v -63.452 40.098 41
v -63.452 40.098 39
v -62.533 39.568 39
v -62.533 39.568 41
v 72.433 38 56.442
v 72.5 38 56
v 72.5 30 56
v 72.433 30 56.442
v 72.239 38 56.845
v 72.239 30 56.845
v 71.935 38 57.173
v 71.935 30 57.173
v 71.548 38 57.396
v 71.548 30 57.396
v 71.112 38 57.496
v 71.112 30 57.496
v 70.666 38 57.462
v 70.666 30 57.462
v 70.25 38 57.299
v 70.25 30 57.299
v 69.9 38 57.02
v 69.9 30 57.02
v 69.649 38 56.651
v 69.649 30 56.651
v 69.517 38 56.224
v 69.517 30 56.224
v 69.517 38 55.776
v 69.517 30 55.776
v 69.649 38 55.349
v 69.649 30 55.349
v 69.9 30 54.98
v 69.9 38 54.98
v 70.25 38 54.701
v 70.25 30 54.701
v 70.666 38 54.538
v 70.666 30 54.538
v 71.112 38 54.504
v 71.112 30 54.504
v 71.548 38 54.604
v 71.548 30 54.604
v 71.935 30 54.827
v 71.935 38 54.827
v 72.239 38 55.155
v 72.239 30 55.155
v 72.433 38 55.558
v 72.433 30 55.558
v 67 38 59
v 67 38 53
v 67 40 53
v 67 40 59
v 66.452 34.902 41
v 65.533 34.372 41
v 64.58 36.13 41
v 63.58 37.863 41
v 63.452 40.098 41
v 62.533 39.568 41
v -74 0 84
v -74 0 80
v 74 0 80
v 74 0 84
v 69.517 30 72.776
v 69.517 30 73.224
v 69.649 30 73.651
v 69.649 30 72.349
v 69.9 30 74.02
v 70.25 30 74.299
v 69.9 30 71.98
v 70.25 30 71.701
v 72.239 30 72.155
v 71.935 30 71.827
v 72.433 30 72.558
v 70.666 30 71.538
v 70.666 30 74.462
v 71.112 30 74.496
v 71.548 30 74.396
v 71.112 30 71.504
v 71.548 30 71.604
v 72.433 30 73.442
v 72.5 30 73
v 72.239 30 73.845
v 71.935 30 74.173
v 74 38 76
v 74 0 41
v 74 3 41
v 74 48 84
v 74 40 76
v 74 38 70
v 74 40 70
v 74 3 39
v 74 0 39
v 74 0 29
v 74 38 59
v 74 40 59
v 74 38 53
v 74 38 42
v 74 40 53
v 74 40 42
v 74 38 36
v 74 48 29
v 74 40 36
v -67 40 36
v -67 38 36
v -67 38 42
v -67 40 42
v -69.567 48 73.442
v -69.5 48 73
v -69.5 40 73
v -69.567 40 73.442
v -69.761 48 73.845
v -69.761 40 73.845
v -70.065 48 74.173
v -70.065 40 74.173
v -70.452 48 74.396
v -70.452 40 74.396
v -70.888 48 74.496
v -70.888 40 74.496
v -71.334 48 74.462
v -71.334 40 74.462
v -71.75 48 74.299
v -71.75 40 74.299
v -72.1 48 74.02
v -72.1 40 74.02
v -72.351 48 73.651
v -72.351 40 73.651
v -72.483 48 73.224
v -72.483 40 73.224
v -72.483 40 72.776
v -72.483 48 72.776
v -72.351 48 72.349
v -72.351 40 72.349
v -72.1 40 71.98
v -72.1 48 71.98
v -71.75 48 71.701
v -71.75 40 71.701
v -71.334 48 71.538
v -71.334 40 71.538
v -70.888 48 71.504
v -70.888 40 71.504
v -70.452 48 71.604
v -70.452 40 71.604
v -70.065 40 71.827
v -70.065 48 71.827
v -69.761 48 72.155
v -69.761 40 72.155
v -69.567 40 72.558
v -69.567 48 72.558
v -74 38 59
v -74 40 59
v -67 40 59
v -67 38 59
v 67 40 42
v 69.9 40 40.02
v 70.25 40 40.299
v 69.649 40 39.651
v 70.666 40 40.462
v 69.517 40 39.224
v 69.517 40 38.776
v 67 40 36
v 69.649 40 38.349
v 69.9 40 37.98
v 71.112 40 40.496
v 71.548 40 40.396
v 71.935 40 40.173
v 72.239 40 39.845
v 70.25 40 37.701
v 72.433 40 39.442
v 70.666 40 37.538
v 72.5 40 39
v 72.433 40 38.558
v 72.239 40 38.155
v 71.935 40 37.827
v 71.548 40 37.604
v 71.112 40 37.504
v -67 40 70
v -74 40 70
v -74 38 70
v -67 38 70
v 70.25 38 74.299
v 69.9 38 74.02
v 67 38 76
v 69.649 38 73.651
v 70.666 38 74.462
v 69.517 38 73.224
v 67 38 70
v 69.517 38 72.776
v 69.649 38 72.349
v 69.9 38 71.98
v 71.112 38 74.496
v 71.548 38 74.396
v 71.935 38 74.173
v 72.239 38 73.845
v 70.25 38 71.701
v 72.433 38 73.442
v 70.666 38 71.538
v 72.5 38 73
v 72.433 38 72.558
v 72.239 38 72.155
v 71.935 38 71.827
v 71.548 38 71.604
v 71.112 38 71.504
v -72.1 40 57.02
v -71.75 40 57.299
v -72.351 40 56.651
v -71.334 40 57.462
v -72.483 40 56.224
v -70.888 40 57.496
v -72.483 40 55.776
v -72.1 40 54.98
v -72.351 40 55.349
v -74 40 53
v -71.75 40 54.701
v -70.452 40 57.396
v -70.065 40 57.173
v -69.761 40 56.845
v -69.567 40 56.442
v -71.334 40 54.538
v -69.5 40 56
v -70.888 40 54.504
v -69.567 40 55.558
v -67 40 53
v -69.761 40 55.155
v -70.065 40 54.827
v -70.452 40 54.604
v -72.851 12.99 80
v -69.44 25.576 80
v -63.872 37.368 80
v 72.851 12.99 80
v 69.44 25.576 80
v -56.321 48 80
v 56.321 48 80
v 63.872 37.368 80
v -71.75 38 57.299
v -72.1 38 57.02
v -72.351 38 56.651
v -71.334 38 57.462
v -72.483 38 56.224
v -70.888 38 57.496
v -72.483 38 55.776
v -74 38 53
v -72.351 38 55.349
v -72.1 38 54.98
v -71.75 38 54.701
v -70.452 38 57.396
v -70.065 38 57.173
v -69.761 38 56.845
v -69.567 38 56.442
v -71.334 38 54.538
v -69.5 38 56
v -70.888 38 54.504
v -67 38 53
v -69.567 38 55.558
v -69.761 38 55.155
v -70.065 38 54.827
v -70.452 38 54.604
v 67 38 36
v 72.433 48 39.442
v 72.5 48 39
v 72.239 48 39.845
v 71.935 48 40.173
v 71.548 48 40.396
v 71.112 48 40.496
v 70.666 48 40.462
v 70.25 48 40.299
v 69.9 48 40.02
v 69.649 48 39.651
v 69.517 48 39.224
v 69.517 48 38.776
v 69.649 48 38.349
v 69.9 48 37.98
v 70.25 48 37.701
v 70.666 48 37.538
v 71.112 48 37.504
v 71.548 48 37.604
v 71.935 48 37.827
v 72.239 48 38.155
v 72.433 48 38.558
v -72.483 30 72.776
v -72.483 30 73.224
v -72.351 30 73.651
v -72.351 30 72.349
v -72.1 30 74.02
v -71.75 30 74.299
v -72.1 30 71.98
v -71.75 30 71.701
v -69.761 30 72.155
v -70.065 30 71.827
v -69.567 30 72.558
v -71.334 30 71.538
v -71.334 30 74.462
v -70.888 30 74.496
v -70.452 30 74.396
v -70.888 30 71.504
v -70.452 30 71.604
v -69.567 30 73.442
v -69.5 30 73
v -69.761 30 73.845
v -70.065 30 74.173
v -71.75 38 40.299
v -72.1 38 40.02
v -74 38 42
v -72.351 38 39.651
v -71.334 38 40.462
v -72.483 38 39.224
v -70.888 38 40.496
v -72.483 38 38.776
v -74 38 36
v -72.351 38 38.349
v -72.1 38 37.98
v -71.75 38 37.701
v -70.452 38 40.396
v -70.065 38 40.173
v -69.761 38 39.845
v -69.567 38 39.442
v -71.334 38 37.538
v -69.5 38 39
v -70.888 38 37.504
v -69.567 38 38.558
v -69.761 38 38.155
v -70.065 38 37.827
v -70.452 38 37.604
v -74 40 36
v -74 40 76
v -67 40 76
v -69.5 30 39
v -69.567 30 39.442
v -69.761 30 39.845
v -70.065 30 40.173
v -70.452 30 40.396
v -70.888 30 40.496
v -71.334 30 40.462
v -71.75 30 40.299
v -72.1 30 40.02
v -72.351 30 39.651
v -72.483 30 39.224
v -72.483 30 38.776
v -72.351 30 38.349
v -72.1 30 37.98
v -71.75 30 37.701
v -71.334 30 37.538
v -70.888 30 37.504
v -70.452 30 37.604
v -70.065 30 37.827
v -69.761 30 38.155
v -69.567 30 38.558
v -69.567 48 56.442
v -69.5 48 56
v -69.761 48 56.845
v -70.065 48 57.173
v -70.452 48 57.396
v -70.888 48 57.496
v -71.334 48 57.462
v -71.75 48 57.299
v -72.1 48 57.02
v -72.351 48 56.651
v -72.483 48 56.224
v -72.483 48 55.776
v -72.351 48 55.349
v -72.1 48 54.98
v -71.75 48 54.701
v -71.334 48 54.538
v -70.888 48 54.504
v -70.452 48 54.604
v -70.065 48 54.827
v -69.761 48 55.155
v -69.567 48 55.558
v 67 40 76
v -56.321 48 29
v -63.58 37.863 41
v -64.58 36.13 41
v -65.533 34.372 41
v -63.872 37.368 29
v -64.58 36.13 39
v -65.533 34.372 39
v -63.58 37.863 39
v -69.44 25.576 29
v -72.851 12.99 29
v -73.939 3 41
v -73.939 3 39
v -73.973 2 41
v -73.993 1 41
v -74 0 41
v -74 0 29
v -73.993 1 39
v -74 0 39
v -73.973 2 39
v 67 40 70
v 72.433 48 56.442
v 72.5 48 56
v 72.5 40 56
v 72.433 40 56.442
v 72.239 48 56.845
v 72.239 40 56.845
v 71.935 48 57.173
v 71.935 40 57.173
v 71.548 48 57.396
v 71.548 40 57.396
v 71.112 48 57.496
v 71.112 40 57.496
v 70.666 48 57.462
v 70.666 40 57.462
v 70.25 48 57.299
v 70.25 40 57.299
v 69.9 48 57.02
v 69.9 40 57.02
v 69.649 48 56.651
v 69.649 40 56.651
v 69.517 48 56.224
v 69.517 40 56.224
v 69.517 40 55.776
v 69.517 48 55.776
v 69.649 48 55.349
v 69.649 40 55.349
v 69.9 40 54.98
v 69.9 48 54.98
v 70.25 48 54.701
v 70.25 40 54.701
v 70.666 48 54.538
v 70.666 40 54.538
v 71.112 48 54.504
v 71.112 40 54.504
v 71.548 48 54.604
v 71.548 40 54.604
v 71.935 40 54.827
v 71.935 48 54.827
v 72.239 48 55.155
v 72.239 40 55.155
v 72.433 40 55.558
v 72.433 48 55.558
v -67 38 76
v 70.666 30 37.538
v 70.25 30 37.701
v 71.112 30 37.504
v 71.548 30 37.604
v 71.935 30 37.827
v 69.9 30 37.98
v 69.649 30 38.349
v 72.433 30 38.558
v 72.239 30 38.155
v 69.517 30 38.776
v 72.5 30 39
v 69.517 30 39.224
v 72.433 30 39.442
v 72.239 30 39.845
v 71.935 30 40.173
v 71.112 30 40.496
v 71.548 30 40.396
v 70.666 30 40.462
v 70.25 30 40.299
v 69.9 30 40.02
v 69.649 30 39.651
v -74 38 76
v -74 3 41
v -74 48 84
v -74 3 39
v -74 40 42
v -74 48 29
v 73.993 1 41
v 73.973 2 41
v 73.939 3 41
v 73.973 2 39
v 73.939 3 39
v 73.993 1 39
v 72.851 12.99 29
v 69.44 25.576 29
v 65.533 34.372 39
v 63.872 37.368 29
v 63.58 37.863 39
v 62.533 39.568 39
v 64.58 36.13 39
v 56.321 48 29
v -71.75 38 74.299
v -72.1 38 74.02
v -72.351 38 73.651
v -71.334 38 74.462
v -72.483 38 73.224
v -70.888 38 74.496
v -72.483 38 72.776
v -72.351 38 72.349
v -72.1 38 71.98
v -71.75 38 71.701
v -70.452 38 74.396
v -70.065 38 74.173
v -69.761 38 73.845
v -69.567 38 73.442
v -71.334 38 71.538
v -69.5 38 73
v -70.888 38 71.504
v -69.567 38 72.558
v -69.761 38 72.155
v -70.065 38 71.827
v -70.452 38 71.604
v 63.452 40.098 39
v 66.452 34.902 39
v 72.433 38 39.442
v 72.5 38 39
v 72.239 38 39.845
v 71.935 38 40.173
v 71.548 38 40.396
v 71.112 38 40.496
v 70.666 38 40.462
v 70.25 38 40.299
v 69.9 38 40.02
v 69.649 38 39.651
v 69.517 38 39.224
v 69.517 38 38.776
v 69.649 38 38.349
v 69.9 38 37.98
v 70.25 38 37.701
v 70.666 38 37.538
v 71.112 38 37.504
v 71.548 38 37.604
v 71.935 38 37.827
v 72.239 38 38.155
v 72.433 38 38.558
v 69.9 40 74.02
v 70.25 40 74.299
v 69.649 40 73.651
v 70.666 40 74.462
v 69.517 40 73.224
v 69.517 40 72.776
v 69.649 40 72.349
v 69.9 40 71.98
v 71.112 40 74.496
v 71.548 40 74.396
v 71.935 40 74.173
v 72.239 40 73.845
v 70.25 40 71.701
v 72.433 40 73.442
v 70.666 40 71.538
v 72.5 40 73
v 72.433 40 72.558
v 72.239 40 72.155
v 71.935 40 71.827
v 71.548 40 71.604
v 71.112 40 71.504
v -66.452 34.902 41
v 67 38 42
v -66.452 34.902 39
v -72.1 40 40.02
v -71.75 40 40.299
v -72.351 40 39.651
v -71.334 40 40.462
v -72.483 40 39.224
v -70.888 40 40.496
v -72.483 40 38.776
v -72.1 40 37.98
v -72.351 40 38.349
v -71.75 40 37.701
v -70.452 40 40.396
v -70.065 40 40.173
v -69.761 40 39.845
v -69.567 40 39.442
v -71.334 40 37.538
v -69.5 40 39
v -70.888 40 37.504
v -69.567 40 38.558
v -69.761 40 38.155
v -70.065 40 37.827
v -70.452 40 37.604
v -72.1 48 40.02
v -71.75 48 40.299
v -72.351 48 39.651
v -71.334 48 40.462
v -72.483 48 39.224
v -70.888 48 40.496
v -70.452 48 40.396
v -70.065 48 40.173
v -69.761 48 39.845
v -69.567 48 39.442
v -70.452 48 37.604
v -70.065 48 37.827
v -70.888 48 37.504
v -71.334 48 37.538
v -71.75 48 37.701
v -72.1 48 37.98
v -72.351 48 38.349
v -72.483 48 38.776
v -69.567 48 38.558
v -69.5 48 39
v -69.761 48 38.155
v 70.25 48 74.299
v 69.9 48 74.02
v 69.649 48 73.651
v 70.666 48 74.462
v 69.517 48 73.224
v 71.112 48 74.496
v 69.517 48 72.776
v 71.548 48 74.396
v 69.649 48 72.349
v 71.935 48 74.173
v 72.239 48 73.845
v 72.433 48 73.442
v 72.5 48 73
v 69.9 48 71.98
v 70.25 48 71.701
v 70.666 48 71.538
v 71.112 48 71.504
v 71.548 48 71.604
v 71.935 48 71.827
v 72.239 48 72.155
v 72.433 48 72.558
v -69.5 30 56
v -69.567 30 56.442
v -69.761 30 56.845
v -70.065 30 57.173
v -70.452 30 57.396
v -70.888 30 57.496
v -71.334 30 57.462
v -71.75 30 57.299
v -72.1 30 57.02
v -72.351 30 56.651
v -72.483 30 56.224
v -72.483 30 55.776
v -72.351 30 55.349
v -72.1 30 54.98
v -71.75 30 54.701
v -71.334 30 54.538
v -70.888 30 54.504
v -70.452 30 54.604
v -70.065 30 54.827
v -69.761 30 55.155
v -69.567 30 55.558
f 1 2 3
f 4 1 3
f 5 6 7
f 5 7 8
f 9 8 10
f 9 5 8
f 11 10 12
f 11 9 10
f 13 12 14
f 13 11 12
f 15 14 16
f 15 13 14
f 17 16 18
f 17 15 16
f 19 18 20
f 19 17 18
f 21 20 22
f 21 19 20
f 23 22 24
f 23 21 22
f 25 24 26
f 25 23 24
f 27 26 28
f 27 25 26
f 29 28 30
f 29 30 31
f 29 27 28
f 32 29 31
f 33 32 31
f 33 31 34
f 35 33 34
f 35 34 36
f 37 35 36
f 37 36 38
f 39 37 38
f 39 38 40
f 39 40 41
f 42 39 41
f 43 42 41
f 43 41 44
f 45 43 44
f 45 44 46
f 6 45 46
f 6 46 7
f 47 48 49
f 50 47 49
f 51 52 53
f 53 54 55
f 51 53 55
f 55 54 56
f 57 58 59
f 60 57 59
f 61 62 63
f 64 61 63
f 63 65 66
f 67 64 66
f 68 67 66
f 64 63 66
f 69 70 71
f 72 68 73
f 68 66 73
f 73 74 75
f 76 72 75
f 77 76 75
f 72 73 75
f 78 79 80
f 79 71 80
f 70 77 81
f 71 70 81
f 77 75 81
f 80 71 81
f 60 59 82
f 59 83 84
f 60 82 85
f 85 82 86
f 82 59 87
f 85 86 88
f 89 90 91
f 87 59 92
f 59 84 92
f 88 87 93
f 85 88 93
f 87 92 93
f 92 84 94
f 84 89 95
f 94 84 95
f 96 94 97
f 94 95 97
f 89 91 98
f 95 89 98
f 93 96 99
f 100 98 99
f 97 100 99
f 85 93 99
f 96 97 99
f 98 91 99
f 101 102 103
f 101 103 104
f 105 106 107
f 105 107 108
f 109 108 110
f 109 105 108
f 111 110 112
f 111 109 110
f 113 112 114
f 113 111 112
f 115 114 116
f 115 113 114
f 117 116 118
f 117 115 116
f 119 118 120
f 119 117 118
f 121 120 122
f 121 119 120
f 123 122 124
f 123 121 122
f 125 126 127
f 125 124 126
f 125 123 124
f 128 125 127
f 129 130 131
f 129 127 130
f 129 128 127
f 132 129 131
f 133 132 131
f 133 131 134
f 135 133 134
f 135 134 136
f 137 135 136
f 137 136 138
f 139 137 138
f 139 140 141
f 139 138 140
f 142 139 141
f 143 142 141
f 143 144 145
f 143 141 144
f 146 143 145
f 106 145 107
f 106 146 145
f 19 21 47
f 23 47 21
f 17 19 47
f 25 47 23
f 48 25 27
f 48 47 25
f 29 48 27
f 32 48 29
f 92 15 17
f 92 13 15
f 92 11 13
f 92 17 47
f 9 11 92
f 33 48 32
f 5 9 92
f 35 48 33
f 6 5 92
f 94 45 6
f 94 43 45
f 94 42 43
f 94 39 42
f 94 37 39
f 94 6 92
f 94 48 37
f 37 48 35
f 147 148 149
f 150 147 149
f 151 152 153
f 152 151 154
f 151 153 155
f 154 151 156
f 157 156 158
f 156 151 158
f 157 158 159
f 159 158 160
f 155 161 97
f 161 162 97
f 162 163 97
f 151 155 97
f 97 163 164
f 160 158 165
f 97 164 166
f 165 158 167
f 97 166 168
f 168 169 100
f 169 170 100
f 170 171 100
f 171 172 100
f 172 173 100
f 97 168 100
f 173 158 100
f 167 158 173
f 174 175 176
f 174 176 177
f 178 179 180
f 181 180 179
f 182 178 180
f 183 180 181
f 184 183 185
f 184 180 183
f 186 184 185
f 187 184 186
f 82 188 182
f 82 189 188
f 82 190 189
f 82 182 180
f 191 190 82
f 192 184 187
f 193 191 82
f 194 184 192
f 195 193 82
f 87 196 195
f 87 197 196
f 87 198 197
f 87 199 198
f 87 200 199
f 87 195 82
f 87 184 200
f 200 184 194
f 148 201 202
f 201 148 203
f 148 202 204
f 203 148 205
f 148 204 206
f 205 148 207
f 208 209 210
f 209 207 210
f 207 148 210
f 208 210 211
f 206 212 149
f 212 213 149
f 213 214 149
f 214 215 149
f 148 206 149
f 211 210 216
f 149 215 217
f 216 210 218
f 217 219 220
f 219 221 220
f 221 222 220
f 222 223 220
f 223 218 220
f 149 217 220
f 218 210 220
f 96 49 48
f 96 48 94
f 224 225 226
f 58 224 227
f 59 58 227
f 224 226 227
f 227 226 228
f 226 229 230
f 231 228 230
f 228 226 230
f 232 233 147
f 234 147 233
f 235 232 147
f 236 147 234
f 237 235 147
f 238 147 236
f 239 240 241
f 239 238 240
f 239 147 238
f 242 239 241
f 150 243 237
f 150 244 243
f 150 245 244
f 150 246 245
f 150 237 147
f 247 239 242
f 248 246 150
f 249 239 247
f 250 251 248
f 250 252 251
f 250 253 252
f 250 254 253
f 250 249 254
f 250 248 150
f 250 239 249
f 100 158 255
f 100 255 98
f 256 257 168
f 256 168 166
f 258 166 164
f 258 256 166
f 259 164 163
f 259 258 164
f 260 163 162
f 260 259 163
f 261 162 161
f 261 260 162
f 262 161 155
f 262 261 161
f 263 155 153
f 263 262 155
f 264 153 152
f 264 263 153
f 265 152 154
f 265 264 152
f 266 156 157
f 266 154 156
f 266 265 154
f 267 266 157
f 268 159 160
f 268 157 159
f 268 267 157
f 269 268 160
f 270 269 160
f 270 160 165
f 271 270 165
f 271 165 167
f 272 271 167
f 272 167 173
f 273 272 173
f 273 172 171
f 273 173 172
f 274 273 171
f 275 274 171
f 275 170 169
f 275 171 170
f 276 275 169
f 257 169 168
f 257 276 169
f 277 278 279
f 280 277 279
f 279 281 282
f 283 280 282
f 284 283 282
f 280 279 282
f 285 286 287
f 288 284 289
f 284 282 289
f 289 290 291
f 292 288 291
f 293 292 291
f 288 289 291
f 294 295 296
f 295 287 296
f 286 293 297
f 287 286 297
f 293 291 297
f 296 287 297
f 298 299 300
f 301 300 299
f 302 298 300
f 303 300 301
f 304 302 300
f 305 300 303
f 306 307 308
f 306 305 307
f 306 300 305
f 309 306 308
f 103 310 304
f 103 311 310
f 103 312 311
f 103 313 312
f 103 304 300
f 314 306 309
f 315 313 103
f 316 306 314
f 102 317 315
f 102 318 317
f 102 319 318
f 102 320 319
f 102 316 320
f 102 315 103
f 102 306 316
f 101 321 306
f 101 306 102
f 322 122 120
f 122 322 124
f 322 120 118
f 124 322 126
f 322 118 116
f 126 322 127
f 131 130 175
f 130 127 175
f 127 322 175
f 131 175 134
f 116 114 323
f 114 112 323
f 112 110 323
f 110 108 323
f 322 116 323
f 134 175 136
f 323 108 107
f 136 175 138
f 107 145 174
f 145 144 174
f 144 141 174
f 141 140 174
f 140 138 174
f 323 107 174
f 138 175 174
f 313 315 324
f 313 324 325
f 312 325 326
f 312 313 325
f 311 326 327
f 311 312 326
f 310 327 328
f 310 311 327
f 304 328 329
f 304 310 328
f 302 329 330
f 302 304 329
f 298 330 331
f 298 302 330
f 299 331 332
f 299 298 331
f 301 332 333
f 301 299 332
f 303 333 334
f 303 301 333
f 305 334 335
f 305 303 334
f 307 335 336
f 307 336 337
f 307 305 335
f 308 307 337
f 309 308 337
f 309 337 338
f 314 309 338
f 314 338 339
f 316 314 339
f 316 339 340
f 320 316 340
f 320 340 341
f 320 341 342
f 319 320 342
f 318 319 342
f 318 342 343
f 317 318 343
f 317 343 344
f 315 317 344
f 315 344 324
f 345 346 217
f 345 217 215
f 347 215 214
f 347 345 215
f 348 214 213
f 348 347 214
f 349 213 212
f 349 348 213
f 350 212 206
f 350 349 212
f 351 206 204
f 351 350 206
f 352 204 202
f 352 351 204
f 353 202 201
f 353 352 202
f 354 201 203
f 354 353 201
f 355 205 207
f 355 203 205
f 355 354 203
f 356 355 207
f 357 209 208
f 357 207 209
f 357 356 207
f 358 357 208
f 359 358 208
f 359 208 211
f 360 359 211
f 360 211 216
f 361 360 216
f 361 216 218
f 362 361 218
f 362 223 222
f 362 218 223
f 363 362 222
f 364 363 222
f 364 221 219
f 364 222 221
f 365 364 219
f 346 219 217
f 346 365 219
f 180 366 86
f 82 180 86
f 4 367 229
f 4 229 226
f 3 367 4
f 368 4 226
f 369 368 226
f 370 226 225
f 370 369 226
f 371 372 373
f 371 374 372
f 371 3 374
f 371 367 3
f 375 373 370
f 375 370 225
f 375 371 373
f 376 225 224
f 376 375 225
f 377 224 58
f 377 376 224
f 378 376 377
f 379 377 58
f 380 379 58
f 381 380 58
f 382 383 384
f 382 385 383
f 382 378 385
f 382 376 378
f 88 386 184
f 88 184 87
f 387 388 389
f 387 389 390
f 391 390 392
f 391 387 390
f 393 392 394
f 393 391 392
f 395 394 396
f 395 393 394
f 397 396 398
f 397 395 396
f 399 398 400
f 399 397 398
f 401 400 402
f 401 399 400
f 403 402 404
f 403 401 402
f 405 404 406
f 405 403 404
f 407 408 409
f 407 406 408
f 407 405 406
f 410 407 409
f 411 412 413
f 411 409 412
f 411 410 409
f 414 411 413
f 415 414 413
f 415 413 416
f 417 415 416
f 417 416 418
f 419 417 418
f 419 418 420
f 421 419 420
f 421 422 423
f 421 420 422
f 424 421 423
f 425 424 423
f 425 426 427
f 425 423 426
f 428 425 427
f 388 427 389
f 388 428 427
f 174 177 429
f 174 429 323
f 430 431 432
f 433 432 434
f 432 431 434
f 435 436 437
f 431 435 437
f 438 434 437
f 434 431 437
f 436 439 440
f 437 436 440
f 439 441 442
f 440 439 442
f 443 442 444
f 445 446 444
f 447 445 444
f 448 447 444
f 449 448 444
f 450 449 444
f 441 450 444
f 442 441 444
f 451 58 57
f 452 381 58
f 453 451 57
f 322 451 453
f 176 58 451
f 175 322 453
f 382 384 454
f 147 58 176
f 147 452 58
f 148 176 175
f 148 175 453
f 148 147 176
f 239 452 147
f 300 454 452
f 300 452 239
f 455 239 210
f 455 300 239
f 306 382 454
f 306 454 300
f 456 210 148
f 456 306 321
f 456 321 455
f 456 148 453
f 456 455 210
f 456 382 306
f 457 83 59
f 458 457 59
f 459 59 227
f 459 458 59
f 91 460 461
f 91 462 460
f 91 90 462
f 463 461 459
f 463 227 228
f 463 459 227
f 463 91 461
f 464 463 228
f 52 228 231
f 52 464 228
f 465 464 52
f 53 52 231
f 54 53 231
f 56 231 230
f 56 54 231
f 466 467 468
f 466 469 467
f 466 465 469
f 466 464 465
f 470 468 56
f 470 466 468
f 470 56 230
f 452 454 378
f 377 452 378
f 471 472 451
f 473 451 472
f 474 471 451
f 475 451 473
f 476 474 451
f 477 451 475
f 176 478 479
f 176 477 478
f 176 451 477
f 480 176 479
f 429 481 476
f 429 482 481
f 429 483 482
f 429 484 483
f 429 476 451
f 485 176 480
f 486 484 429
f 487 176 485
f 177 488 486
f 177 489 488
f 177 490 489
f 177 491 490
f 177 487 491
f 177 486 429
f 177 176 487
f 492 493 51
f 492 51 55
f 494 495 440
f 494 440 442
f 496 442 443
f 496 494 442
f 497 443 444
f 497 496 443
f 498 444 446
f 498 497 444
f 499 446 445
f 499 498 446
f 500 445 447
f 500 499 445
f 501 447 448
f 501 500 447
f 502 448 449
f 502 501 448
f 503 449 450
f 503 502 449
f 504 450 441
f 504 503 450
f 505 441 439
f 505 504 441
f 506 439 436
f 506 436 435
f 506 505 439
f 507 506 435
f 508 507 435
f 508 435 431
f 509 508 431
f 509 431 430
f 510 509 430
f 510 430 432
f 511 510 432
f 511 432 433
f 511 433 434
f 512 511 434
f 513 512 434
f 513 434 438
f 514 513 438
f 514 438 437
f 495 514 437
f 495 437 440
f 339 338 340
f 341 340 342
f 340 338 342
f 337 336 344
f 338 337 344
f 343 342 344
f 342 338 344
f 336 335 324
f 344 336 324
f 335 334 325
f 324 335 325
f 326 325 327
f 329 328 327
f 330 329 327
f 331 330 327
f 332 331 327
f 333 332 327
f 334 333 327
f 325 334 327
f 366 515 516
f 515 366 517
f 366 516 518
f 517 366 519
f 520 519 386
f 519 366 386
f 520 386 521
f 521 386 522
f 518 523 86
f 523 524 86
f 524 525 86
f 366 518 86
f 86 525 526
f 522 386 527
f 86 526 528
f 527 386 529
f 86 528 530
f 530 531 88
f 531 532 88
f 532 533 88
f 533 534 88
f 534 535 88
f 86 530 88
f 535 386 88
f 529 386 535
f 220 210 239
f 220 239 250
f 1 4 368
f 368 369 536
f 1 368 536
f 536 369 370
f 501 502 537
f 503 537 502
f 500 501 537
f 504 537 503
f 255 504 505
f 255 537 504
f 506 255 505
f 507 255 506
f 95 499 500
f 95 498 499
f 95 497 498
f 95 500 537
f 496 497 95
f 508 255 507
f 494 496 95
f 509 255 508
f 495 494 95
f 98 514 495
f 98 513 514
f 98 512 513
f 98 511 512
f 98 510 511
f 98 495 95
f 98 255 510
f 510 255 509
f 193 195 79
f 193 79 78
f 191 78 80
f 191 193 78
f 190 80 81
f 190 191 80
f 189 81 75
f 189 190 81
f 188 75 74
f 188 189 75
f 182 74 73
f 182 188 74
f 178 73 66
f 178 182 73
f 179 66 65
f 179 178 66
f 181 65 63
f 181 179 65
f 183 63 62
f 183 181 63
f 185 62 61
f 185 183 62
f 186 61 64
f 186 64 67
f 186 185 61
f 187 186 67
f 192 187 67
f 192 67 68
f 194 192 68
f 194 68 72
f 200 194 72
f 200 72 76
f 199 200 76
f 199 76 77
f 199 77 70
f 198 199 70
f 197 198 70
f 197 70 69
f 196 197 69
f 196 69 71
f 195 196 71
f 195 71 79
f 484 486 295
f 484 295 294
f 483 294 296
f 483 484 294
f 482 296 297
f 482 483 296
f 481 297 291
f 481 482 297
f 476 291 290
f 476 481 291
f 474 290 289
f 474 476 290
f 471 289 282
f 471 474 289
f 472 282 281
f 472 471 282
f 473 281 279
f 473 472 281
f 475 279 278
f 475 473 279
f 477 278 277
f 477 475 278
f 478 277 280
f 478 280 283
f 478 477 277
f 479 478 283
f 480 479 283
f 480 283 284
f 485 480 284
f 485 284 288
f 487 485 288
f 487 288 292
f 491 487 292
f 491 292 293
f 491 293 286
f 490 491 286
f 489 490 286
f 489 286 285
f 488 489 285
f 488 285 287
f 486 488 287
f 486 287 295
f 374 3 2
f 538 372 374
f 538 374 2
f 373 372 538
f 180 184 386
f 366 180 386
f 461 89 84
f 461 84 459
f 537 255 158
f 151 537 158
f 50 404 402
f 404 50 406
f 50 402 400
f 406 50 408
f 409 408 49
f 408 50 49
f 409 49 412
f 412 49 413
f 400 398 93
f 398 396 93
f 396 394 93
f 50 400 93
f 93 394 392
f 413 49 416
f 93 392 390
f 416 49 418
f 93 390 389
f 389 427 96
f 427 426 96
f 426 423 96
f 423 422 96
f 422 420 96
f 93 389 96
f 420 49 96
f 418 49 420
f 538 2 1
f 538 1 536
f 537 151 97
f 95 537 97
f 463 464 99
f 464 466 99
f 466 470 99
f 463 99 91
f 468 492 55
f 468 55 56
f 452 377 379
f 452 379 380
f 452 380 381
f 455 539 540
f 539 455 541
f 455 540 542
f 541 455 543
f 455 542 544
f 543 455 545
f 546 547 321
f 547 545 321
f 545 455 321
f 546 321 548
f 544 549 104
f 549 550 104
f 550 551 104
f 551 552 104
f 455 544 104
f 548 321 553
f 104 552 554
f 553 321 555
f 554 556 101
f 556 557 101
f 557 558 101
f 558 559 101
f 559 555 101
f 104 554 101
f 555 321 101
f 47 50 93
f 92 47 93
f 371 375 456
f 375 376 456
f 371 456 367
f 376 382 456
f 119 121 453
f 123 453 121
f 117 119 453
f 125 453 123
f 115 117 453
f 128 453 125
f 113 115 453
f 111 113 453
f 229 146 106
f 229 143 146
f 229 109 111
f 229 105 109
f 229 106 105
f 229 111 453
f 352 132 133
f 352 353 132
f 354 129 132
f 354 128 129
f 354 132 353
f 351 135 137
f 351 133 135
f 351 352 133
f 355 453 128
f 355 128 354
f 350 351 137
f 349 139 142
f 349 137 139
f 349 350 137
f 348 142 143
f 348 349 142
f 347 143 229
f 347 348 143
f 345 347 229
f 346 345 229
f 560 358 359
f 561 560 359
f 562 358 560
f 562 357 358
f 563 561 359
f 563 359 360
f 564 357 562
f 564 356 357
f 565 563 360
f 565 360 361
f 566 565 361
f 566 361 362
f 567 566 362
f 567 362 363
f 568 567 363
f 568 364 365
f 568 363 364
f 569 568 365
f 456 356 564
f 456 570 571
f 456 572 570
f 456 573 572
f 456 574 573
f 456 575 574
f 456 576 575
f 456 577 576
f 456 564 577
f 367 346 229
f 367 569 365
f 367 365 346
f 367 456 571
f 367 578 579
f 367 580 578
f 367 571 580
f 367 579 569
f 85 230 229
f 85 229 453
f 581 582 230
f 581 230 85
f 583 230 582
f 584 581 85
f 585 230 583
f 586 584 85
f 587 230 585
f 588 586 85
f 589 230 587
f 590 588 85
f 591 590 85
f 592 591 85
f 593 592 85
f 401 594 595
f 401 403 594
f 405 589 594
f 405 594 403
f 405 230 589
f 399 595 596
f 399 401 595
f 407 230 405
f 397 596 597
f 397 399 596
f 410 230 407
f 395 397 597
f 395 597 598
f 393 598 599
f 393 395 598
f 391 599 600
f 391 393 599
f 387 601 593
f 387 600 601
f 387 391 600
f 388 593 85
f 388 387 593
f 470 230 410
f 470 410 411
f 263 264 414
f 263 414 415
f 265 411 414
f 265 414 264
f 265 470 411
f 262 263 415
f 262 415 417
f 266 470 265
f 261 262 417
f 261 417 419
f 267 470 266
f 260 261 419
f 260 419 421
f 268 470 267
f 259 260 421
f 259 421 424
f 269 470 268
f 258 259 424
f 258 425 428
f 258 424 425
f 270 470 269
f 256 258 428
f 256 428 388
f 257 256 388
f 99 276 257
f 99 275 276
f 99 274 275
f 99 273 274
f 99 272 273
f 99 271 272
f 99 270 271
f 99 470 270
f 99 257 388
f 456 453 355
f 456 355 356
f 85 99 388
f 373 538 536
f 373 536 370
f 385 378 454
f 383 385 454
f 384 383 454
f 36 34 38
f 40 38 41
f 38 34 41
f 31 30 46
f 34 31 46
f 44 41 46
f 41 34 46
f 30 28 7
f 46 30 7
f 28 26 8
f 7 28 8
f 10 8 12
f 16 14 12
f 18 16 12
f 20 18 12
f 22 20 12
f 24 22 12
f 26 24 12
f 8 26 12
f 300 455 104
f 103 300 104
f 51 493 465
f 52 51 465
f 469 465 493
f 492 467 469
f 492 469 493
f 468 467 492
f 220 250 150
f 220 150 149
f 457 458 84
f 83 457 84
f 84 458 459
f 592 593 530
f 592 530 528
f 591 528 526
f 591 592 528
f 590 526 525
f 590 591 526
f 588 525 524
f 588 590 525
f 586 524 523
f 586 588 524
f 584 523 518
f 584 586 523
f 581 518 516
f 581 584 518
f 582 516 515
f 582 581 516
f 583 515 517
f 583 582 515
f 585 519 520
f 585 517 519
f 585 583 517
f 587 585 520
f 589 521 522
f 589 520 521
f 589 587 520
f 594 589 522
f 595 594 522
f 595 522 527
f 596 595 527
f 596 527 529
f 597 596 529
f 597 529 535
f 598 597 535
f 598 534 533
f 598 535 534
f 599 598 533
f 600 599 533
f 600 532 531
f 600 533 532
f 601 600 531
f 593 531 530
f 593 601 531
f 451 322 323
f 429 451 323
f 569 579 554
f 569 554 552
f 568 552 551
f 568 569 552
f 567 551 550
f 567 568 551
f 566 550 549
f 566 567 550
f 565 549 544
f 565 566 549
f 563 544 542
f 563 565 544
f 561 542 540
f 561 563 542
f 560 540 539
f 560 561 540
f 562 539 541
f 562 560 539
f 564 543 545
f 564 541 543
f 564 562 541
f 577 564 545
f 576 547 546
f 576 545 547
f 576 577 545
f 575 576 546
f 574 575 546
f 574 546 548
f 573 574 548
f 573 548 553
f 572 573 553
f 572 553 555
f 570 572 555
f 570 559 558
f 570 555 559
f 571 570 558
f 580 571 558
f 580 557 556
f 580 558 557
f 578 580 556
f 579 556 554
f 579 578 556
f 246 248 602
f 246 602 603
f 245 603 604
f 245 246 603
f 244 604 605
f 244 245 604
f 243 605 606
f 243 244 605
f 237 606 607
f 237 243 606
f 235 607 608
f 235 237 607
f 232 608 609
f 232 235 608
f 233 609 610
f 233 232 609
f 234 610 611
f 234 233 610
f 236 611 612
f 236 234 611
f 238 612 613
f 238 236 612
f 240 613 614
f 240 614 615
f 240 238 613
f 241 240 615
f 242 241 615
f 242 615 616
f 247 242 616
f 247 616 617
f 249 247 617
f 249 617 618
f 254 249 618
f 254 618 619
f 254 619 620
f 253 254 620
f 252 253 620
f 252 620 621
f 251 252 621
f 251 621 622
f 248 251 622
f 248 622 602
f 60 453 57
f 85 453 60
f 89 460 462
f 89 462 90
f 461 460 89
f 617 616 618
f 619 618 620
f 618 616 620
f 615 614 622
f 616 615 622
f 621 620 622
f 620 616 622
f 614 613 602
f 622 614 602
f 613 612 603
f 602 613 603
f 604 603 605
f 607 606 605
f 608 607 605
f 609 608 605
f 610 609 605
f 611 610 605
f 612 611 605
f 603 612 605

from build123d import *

# Parameters (mm, degrees)
BOX700_W               = 6
BOX700_H               = 8
BOX700_DEPTH           = 2
BOX700_PLACEMENT_ANGLE = 30
BOX701_W               = 6
BOX701_H               = 8
BOX701_DEPTH           = 2
BOX701_PLACEMENT_ANGLE = 60
BOX702_W               = 6
BOX702_H               = 8
BOX702_DEPTH           = 2
BOX703_W               = 6
BOX703_H               = 8
BOX703_DEPTH           = 2
BOX703_PLACEMENT_ANGLE = 120
BOX704_W               = 6
BOX704_H               = 8
BOX704_DEPTH           = 2
BOX704_PLACEMENT_ANGLE = 150
BOX705_W               = 6
BOX705_H               = 8
BOX705_DEPTH           = 2
BOX706_W               = 6
BOX706_H               = 8
BOX706_DEPTH           = 2
BOX706_PLACEMENT_ANGLE = 210
BOX707_W               = 6
BOX707_H               = 8
BOX707_DEPTH           = 2
BOX707_PLACEMENT_ANGLE = 240
BOX708_W               = 6
BOX708_H               = 8
BOX708_DEPTH           = 2
BOX709_W               = 6
BOX709_H               = 8
BOX709_DEPTH           = 2
BOX709_PLACEMENT_ANGLE = 60
BOX710_W               = 6
BOX710_H               = 8
BOX710_DEPTH           = 2
BOX710_PLACEMENT_ANGLE = 30
BOX699_W               = 6
BOX699_H               = 8
BOX699_DEPTH           = 2
BOX513_W               = 8
BOX513_H               = 2
BOX513_DEPTH           = 6
BOX514_W               = 8
BOX514_H               = 2
BOX514_DEPTH           = 6
BOX515_W               = 8
BOX515_H               = 2
BOX515_DEPTH           = 6
BOX516_W               = 8
BOX516_H               = 2
BOX516_DEPTH           = 6
BOX517_W               = 8
BOX517_H               = 2
BOX517_DEPTH           = 6
BOX512_W               = 8
BOX512_H               = 2
BOX512_DEPTH           = 6
CYLINDER1754_R         = 1.5
CYLINDER1754_DEPTH     = 50
CYLINDER1755_R         = 1.5
CYLINDER1755_DEPTH     = 50
CYLINDER1756_R         = 1.5
CYLINDER1756_DEPTH     = 50
CYLINDER1757_R         = 1.5
CYLINDER1757_DEPTH     = 50
CYLINDER1758_R         = 1.5
CYLINDER1758_DEPTH     = 50
CYLINDER1753_R         = 1.5
CYLINDER1753_DEPTH     = 50
BOX484_W               = 148
BOX484_H               = 26
BOX484_DEPTH           = 55
CYLINDER972_R          = 74
CYLINDER972_DEPTH      = 51
BOX482_W               = 148
BOX482_H               = 74
BOX482_DEPTH           = 55


with BuildPart() as krychle700:
    # Box700 → Box700 (new body)
    with BuildSketch(Plane.XY):
        with Locations((3, 4)):
            Rectangle(BOX700_W, BOX700_H)
    extrude(amount=BOX700_DEPTH)


with BuildPart() as krychle700_1:
    # Box700 placement: moved
    add(krychle700.part.moved(Location((34.901924, -66.451905, 39))).rotate(Axis((34.901924, -66.451905, 39), (0, 0, 1)), BOX700_PLACEMENT_ANGLE))


with BuildPart() as krychle701:
    # Box701 → Box701 (new body)
    with BuildSketch(Plane.XY):
        with Locations((3, 4)):
            Rectangle(BOX701_W, BOX701_H)
    extrude(amount=BOX701_DEPTH)


with BuildPart() as krychle701_1:
    # Box701 placement: moved
    add(krychle701.part.moved(Location((63.451905, -40.098076, 39))).rotate(Axis((63.451905, -40.098076, 39), (0, 0, 1)), BOX701_PLACEMENT_ANGLE))


with BuildPart() as krychle702:
    # Box702 → Box702 (new body)
    with BuildSketch(Plane(origin=(75, -3, 39), x_dir=(0, 1, 0), z_dir=(0, 0, 1))):
        with Locations((3, 4)):
            Rectangle(BOX702_W, BOX702_H)
    extrude(amount=BOX702_DEPTH)


with BuildPart() as krychle703:
    # Box703 → Box703 (new body)
    with BuildSketch(Plane.XY):
        with Locations((3, 4)):
            Rectangle(BOX703_W, BOX703_H)
    extrude(amount=BOX703_DEPTH)


with BuildPart() as krychle703_1:
    # Box703 placement: moved
    add(krychle703.part.moved(Location((66.451905, 34.901924, 39))).rotate(Axis((66.451905, 34.901924, 39), (0, 0, 1)), BOX703_PLACEMENT_ANGLE))


with BuildPart() as krychle704:
    # Box704 → Box704 (new body)
    with BuildSketch(Plane.XY):
        with Locations((3, 4)):
            Rectangle(BOX704_W, BOX704_H)
    extrude(amount=BOX704_DEPTH)


with BuildPart() as krychle704_1:
    # Box704 placement: moved
    add(krychle704.part.moved(Location((40.098076, 63.451905, 39))).rotate(Axis((40.098076, 63.451905, 39), (0, 0, 1)), BOX704_PLACEMENT_ANGLE))


with BuildPart() as krychle705:
    # Box705 → Box705 (new body)
    with BuildSketch(Plane(origin=(3, 75, 39), x_dir=(-1, 0, 0), z_dir=(0, 0, 1))):
        with Locations((3, 4)):
            Rectangle(BOX705_W, BOX705_H)
    extrude(amount=BOX705_DEPTH)


with BuildPart() as krychle706:
    # Box706 → Box706 (new body)
    with BuildSketch(Plane.XY):
        with Locations((3, 4)):
            Rectangle(BOX706_W, BOX706_H)
    extrude(amount=BOX706_DEPTH)


with BuildPart() as krychle706_1:
    # Box706 placement: moved
    add(krychle706.part.moved(Location((-34.901924, 66.451905, 39))).rotate(Axis((-34.901924, 66.451905, 39), (0, 0, 1)), BOX706_PLACEMENT_ANGLE))


with BuildPart() as krychle707:
    # Box707 → Box707 (new body)
    with BuildSketch(Plane.XY):
        with Locations((3, 4)):
            Rectangle(BOX707_W, BOX707_H)
    extrude(amount=BOX707_DEPTH)


with BuildPart() as krychle707_1:
    # Box707 placement: moved
    add(krychle707.part.moved(Location((-63.451905, 40.098076, 39))).rotate(Axis((-63.451905, 40.098076, 39), (0, 0, 1)), BOX707_PLACEMENT_ANGLE))


with BuildPart() as krychle708:
    # Box708 → Box708 (new body)
    with BuildSketch(Plane(origin=(-75, 3, 39), x_dir=(0, -1, 0), z_dir=(0, 0, 1))):
        with Locations((3, 4)):
            Rectangle(BOX708_W, BOX708_H)
    extrude(amount=BOX708_DEPTH)


with BuildPart() as krychle709:
    # Box709 → Box709 (new body)
    with BuildSketch(Plane.XY):
        with Locations((3, 4)):
            Rectangle(BOX709_W, BOX709_H)
    extrude(amount=BOX709_DEPTH)


with BuildPart() as krychle709_1:
    # Box709 placement: moved
    add(krychle709.part.moved(Location((-66.451905, -34.901924, 39))).rotate(Axis((-66.451905, -34.901924, 39), (0, 0, -1)), BOX709_PLACEMENT_ANGLE))


with BuildPart() as krychle710:
    # Box710 → Box710 (new body)
    with BuildSketch(Plane.XY):
        with Locations((3, 4)):
            Rectangle(BOX710_W, BOX710_H)
    extrude(amount=BOX710_DEPTH)


with BuildPart() as krychle710_1:
    # Box710 placement: moved
    add(krychle710.part.moved(Location((-40.098076, -63.451905, 39))).rotate(Axis((-40.098076, -63.451905, 39), (0, 0, -1)), BOX710_PLACEMENT_ANGLE))


with BuildPart() as compound888:
    # Box699 → Box699 (new body)
    with BuildSketch(Plane(origin=(-3, -75, 39), x_dir=(1, 0, 0), z_dir=(0, 0, 1))):
        with Locations((3, 4)):
            Rectangle(BOX699_W, BOX699_H)
    extrude(amount=BOX699_DEPTH)

    # Compound888: union Krychle700, Krychle701, Krychle702, Krychle703, Krychle704, Krychle705, Krychle706, Krychle707, Krychle708, Krychle709, Krychle710
    add(krychle700_1.part)
    add(krychle701_1.part)
    add(krychle702.part)
    add(krychle703_1.part)
    add(krychle704_1.part)
    add(krychle705.part)
    add(krychle706_1.part)
    add(krychle707_1.part)
    add(krychle708.part)
    add(krychle709_1.part)
    add(krychle710_1.part)


with BuildPart() as krychle513:
    # Box513 → Box513 (new body)
    with BuildSketch(Plane(origin=(67, 38, 36), x_dir=(1, 0, 0), z_dir=(0, 0, 1))):
        with Locations((4, 1)):
            Rectangle(BOX513_W, BOX513_H)
    extrude(amount=BOX513_DEPTH)


with BuildPart() as krychle514:
    # Box514 → Box514 (new body)
    with BuildSketch(Plane(origin=(67, 38, 70), x_dir=(1, 0, 0), z_dir=(0, 0, 1))):
        with Locations((4, 1)):
            Rectangle(BOX514_W, BOX514_H)
    extrude(amount=BOX514_DEPTH)


with BuildPart() as krychle515:
    # Box515 → Box515 (new body)
    with BuildSketch(Plane(origin=(-75, 38, 70), x_dir=(1, 0, 0), z_dir=(0, 0, 1))):
        with Locations((4, 1)):
            Rectangle(BOX515_W, BOX515_H)
    extrude(amount=BOX515_DEPTH)


with BuildPart() as krychle516:
    # Box516 → Box516 (new body)
    with BuildSketch(Plane(origin=(-75, 38, 53), x_dir=(1, 0, 0), z_dir=(0, 0, 1))):
        with Locations((4, 1)):
            Rectangle(BOX516_W, BOX516_H)
    extrude(amount=BOX516_DEPTH)


with BuildPart() as krychle517:
    # Box517 → Box517 (new body)
    with BuildSketch(Plane(origin=(67, 38, 53), x_dir=(1, 0, 0), z_dir=(0, 0, 1))):
        with Locations((4, 1)):
            Rectangle(BOX517_W, BOX517_H)
    extrude(amount=BOX517_DEPTH)


with BuildPart() as compound530:
    # Box512 → Box512 (new body)
    with BuildSketch(Plane(origin=(-75, 38, 36), x_dir=(1, 0, 0), z_dir=(0, 0, 1))):
        with Locations((4, 1)):
            Rectangle(BOX512_W, BOX512_H)
    extrude(amount=BOX512_DEPTH)

    # Compound530: union Krychle513, Krychle514, Krychle515, Krychle516, Krychle517
    add(krychle513.part)
    add(krychle514.part)
    add(krychle515.part)
    add(krychle516.part)
    add(krychle517.part)


with BuildPart() as v_lec1754:
    # Cylinder1754 → Cylinder1754 (new body)
    with BuildSketch(Plane(origin=(71, 80, 39), x_dir=(1, 0, 0), z_dir=(0, -1, 0))):
        Circle(CYLINDER1754_R)
    extrude(amount=CYLINDER1754_DEPTH)


with BuildPart() as v_lec1755:
    # Cylinder1755 → Cylinder1755 (new body)
    with BuildSketch(Plane(origin=(-71, 80, 39), x_dir=(1, 0, 0), z_dir=(0, -1, 0))):
        Circle(CYLINDER1755_R)
    extrude(amount=CYLINDER1755_DEPTH)


with BuildPart() as v_lec1756:
    # Cylinder1756 → Cylinder1756 (new body)
    with BuildSketch(Plane(origin=(71, 80, 73), x_dir=(1, 0, 0), z_dir=(0, -1, 0))):
        Circle(CYLINDER1756_R)
    extrude(amount=CYLINDER1756_DEPTH)


with BuildPart() as v_lec1757:
    # Cylinder1757 → Cylinder1757 (new body)
    with BuildSketch(Plane(origin=(-71, 80, 56), x_dir=(1, 0, 0), z_dir=(0, -1, 0))):
        Circle(CYLINDER1757_R)
    extrude(amount=CYLINDER1757_DEPTH)


with BuildPart() as v_lec1758:
    # Cylinder1758 → Cylinder1758 (new body)
    with BuildSketch(Plane(origin=(71, 80, 56), x_dir=(1, 0, 0), z_dir=(0, -1, 0))):
        Circle(CYLINDER1758_R)
    extrude(amount=CYLINDER1758_DEPTH)


with BuildPart() as compound887:
    # Cylinder1753 → Cylinder1753 (new body)
    with BuildSketch(Plane(origin=(-71, 80, 73), x_dir=(1, 0, 0), z_dir=(0, -1, 0))):
        Circle(CYLINDER1753_R)
    extrude(amount=CYLINDER1753_DEPTH)

    # Compound887: union Válec1754, Válec1755, Válec1756, Válec1757, Válec1758
    add(v_lec1754.part)
    add(v_lec1755.part)
    add(v_lec1756.part)
    add(v_lec1757.part)
    add(v_lec1758.part)


with BuildPart() as krychle484:
    # Box484 → Box484 (new body)
    with BuildSketch(Plane(origin=(-74, 48, 29), x_dir=(1, 0, 0), z_dir=(0, 0, 1))):
        with Locations((74, 13)):
            Rectangle(BOX484_W, BOX484_H)
    extrude(amount=BOX484_DEPTH)


with BuildPart() as v_lec972:
    # Cylinder972 → Cylinder972 (new body)
    with BuildSketch(Plane.XY.offset(29)):
        Circle(CYLINDER972_R)
    extrude(amount=CYLINDER972_DEPTH)


with BuildPart() as cut520:
    # Box482 → Box482 (new body)
    with BuildSketch(Plane(origin=(-74, 0, 29), x_dir=(1, 0, 0), z_dir=(0, 0, 1))):
        with Locations((74, 37)):
            Rectangle(BOX482_W, BOX482_H)
    extrude(amount=BOX482_DEPTH)

    # Cut451: cut Válec972
    add(v_lec972.part, mode=Mode.SUBTRACT)

    # Cut452: cut Krychle484
    add(krychle484.part, mode=Mode.SUBTRACT)

    # Cut518: cut Compound887
    add(compound887.part, mode=Mode.SUBTRACT)

    # Cut519: cut Compound530
    add(compound530.part, mode=Mode.SUBTRACT)

    # Cut520: cut Compound888
    add(compound888.part, mode=Mode.SUBTRACT)


solid = cut520.part
